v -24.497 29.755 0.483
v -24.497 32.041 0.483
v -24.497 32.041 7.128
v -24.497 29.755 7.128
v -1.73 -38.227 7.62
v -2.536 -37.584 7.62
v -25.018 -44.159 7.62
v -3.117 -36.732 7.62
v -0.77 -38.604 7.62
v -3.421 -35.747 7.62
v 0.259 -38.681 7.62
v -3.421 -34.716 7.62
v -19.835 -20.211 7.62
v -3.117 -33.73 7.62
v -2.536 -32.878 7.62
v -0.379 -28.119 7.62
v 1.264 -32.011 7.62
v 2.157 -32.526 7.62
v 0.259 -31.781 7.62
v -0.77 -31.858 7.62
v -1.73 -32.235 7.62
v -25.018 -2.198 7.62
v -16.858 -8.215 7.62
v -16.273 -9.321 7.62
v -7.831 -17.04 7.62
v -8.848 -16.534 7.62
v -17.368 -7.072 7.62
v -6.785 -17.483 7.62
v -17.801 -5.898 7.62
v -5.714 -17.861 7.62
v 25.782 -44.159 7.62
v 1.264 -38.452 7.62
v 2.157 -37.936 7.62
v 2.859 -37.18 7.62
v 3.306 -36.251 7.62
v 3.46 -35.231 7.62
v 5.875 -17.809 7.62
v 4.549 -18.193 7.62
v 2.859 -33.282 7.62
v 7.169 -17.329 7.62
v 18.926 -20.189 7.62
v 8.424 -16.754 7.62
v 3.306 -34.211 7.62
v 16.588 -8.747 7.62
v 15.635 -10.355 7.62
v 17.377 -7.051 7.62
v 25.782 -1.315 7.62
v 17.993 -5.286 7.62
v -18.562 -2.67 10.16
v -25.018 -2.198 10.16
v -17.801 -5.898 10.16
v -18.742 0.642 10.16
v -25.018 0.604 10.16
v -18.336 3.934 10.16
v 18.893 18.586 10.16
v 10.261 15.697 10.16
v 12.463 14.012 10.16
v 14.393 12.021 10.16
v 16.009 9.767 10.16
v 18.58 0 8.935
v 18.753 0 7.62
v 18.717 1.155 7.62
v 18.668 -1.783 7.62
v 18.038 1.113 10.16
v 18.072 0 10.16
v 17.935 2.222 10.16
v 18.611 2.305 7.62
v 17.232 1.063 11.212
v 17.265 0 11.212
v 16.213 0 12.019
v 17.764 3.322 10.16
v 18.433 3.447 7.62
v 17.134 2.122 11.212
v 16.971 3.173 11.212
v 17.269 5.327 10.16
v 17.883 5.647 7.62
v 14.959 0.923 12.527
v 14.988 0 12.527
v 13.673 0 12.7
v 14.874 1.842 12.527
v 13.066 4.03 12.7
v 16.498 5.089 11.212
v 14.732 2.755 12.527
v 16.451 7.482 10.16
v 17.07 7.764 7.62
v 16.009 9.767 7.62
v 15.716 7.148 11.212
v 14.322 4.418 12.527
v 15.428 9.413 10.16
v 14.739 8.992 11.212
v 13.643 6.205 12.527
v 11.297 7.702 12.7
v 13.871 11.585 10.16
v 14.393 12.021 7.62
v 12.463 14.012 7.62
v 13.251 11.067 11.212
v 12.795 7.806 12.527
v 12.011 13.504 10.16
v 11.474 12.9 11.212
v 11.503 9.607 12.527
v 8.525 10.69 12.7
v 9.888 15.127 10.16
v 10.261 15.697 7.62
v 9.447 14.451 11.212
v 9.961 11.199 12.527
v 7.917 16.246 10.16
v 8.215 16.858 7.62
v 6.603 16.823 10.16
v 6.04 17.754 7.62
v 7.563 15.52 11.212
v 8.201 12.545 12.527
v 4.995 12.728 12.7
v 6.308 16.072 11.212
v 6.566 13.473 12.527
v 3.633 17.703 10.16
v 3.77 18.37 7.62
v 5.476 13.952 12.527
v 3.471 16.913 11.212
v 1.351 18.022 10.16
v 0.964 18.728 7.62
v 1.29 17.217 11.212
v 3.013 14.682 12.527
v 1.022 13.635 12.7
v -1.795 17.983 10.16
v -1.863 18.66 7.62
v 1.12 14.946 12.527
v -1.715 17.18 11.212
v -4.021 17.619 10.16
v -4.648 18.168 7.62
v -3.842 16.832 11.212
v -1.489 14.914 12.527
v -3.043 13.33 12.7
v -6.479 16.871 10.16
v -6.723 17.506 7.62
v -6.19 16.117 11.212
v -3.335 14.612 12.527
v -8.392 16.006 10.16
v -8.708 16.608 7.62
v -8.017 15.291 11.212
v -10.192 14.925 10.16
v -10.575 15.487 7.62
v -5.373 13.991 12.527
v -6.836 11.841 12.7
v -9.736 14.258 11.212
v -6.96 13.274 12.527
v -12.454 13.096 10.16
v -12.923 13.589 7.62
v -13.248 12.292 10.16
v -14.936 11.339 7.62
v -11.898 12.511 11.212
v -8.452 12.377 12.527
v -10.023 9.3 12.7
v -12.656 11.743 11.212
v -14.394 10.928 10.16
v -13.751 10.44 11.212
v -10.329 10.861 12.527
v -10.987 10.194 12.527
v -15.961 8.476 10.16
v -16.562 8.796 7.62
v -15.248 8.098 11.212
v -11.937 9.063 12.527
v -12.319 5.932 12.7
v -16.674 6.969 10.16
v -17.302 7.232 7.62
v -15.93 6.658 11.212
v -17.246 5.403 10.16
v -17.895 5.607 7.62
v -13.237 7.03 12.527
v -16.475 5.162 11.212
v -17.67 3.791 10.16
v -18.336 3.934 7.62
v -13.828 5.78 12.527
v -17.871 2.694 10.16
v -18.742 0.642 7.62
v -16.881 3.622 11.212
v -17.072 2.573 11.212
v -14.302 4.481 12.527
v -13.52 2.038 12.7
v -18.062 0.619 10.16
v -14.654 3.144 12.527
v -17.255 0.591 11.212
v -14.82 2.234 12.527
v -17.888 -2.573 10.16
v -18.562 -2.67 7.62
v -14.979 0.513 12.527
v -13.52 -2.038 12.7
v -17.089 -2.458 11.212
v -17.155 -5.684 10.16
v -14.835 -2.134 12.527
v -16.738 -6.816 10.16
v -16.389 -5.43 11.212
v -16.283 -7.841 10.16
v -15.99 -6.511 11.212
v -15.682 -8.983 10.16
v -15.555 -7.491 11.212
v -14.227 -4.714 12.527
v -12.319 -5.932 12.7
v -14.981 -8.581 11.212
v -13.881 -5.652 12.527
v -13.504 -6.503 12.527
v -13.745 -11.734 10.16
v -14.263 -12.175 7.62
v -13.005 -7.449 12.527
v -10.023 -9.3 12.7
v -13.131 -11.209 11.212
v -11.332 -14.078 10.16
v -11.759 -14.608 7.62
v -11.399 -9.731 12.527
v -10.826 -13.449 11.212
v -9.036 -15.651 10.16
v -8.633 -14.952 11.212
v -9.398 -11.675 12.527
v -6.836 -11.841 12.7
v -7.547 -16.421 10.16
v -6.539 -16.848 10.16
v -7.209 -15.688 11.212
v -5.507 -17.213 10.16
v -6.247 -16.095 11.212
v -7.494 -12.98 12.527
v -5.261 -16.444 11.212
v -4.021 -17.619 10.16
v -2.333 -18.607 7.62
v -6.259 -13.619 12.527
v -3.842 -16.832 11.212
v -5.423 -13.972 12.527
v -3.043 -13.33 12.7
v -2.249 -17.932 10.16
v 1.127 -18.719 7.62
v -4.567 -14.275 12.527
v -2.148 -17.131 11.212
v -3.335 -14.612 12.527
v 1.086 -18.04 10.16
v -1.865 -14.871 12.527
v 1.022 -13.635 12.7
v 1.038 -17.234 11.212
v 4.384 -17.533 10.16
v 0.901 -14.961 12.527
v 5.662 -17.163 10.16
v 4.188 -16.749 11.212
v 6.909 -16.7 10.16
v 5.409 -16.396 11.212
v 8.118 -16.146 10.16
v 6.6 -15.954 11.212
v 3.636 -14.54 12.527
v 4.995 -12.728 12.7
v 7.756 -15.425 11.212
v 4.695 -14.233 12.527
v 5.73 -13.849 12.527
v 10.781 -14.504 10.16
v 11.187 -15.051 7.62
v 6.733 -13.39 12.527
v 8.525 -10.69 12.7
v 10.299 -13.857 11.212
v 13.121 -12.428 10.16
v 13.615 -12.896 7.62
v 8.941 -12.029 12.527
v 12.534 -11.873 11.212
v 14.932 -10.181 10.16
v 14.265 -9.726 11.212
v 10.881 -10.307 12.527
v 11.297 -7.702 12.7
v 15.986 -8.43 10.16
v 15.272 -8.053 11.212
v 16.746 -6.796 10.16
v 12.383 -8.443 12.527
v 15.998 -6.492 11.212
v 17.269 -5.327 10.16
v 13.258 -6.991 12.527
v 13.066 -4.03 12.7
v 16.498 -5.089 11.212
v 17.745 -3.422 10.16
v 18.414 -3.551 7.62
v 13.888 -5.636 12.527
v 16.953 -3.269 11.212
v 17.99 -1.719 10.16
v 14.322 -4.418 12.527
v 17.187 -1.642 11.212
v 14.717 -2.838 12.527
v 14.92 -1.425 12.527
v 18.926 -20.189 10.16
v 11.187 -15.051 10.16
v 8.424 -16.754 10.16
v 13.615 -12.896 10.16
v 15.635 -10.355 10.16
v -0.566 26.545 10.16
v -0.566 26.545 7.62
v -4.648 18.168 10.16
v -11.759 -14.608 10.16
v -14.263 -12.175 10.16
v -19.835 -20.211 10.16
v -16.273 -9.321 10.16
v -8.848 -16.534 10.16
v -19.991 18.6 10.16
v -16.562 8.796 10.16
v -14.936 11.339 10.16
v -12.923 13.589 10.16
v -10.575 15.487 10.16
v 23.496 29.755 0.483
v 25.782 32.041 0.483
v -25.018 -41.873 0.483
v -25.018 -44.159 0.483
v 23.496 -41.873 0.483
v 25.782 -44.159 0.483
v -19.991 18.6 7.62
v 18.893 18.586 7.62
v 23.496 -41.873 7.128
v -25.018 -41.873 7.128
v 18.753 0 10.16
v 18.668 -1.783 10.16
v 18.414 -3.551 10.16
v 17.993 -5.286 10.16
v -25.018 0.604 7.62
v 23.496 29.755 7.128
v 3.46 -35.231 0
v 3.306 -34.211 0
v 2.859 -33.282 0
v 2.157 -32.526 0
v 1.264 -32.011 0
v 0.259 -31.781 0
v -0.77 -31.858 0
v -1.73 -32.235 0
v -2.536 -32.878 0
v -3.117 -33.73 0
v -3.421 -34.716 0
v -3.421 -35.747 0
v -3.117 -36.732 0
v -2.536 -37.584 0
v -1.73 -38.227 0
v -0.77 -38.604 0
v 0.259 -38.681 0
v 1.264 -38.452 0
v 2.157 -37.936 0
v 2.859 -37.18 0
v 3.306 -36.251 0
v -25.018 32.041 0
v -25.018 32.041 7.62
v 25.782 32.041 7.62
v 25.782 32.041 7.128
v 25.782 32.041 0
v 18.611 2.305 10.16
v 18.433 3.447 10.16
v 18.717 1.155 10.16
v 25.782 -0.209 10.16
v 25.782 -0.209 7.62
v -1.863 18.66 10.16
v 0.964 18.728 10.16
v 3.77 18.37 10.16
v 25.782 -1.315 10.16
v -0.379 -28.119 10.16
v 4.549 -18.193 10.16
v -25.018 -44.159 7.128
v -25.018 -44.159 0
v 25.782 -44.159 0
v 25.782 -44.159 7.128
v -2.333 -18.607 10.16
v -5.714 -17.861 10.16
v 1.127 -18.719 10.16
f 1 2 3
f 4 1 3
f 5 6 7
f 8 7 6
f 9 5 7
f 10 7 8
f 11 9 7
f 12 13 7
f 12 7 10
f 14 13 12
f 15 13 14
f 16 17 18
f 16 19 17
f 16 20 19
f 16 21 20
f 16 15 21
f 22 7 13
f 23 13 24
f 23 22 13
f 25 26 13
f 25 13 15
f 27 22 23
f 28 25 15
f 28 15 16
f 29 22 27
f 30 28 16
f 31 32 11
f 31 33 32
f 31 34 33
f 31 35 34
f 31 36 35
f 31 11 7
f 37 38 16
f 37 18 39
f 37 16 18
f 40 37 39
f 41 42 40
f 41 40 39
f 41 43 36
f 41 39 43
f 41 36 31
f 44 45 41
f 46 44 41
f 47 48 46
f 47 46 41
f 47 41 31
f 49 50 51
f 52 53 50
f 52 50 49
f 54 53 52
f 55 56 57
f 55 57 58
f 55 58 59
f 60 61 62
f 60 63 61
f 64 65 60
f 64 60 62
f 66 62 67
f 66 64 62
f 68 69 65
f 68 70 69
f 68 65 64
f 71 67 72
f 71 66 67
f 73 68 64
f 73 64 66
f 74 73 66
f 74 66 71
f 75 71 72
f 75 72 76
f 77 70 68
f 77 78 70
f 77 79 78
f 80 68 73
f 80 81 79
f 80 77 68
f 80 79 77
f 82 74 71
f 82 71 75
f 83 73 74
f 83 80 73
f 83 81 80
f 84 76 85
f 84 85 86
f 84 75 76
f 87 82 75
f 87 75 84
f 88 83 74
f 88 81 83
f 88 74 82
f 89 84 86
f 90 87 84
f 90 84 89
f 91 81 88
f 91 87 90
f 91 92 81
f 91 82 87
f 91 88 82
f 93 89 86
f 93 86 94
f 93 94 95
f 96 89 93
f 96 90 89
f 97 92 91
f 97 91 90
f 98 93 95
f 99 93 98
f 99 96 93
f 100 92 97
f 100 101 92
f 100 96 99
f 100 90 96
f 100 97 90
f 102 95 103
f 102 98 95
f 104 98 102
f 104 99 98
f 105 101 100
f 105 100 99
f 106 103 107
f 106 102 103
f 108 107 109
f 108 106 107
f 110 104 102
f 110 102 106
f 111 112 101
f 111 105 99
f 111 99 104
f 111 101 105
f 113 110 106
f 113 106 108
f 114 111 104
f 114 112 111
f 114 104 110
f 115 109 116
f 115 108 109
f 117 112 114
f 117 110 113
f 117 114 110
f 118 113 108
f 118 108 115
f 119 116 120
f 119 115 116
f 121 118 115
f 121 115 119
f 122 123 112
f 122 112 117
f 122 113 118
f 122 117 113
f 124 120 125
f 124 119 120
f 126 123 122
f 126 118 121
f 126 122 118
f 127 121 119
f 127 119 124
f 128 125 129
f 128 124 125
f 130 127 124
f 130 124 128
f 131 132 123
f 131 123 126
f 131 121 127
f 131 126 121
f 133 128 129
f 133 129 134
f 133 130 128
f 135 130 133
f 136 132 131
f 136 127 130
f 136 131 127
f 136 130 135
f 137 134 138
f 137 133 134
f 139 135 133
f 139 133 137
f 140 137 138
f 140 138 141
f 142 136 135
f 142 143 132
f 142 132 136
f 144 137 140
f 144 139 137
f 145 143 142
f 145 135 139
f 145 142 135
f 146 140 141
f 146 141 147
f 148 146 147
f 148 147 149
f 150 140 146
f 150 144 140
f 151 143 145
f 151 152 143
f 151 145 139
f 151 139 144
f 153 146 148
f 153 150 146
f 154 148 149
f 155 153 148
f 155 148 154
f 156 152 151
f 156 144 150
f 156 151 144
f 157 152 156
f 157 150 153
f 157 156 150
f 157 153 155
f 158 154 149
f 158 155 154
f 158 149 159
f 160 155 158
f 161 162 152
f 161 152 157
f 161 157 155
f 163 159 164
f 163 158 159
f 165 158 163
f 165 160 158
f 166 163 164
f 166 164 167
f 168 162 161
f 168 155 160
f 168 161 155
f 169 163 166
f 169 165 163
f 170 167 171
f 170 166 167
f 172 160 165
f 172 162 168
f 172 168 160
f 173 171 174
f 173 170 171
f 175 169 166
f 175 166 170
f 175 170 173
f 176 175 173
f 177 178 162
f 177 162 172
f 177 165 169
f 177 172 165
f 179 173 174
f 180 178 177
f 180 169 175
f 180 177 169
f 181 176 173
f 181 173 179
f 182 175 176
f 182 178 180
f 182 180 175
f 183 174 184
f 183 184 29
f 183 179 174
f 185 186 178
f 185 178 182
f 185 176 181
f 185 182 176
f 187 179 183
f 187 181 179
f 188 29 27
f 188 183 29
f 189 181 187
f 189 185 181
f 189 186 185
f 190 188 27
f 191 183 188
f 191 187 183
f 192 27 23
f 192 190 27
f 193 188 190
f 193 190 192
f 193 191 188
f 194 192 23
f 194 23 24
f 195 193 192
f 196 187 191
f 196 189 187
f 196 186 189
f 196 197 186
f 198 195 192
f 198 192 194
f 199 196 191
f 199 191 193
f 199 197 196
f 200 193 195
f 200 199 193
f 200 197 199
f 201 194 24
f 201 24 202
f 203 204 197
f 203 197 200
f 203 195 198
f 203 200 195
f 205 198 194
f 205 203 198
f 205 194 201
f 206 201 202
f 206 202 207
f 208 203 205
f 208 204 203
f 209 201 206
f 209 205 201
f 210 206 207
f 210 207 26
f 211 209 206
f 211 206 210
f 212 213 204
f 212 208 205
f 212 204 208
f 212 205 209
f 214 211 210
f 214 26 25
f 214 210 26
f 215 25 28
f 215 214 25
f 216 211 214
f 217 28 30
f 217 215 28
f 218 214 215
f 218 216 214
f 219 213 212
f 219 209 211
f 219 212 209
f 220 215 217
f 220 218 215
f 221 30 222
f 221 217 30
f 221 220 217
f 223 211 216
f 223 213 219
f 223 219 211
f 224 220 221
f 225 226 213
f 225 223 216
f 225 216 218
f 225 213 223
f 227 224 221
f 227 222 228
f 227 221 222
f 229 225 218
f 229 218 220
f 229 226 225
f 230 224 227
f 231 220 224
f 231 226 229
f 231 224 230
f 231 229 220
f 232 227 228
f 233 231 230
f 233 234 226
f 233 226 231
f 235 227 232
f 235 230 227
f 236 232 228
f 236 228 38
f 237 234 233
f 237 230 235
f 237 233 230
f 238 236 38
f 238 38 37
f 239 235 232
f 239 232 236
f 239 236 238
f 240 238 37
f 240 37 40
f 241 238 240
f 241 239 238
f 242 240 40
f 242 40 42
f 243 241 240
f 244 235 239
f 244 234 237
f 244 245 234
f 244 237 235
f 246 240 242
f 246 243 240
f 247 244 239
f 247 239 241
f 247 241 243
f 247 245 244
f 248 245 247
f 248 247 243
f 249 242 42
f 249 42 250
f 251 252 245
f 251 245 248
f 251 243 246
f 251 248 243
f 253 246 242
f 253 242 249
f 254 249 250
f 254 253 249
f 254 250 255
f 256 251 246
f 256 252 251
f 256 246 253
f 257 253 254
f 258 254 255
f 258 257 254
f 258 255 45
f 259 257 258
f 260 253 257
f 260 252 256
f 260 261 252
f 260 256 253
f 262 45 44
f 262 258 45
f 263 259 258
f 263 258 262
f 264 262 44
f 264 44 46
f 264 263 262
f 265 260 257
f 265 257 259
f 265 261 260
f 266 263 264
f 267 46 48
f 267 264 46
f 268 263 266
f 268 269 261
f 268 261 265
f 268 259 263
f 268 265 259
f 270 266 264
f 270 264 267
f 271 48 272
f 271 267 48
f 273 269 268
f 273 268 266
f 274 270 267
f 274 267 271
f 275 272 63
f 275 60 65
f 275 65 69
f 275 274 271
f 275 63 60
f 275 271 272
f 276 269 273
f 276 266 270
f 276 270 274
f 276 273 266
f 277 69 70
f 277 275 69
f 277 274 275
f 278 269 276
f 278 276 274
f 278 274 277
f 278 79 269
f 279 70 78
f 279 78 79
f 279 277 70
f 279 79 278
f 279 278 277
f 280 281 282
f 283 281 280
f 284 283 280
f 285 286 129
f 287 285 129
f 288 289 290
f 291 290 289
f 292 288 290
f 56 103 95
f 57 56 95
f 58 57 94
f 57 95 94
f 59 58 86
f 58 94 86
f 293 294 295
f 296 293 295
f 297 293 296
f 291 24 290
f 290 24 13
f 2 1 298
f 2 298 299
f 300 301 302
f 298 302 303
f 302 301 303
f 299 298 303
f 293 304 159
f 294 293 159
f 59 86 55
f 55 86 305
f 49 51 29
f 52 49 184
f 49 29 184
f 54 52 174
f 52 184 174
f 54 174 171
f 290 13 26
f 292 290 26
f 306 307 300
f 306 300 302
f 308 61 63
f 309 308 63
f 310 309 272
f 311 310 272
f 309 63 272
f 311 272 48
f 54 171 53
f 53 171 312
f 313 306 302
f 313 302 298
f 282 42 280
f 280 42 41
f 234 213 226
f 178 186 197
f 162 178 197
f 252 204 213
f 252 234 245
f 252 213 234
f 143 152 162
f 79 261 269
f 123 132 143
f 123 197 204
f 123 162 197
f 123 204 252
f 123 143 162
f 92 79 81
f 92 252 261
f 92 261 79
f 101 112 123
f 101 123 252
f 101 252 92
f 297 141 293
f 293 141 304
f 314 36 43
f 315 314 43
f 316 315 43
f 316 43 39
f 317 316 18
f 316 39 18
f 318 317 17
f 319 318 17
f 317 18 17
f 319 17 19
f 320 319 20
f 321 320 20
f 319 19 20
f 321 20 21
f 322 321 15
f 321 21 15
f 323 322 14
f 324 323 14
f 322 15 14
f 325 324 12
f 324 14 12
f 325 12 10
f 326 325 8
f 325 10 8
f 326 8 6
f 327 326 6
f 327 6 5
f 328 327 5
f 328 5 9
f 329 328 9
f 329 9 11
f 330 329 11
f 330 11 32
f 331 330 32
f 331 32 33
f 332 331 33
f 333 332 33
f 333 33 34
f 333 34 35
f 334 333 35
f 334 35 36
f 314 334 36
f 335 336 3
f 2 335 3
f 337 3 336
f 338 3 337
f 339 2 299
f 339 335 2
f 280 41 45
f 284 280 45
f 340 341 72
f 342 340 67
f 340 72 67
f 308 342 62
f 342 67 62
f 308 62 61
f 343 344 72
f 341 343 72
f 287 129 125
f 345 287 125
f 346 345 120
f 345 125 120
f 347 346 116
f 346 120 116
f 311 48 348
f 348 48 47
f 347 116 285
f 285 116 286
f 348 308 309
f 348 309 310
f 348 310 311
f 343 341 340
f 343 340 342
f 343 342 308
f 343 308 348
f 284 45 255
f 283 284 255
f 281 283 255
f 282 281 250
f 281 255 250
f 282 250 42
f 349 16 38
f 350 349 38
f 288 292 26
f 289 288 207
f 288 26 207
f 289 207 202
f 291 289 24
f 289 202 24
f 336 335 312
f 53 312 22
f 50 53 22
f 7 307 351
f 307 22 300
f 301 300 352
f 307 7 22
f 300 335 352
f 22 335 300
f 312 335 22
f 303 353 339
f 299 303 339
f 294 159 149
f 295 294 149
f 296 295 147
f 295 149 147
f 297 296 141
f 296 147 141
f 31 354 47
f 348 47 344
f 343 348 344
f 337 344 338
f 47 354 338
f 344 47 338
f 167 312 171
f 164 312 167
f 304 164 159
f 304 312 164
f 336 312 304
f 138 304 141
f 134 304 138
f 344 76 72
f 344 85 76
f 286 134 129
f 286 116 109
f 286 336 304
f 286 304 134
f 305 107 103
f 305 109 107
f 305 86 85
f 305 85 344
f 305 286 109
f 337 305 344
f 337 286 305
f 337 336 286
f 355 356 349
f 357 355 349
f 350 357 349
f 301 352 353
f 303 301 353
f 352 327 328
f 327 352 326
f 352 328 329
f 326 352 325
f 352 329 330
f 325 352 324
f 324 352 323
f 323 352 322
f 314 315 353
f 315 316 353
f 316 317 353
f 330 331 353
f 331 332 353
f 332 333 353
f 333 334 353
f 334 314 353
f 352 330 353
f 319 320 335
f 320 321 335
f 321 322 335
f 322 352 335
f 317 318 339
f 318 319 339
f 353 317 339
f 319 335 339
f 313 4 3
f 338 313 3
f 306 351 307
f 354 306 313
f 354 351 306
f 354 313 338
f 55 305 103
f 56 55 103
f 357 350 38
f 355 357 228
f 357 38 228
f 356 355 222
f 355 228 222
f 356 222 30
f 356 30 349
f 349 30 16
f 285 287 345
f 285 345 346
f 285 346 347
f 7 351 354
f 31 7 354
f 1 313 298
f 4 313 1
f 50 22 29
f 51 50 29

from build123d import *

# Parameters (mm, degrees)
F0_W      = 50.8
F0_H      = 76.2
F1_DEPTH  = 7.62
F2_R      = 18.7529717457
F3_DEPTH  = 5.08
F4_R      = 5.07999
F7_DEPTH  = 2.54
F8_W      = 50.2787431046
F8_H      = 6.6451809329
F9_DEPTH  = 2.286
F10_W     = 73.914
F10_H     = 6.6451809329
F11_DEPTH = 2.286
F12_W     = 48.514
F12_H     = 6.6451809329
F13_DEPTH = 2.286
F14_R     = 3.4596539052
F15_DEPTH = 25.4


# Not quite as in the source:
# - a fillet or chamfer is up to 0.001 mm smaller than in the source, because OpenCascade refuses the exact size


with BuildPart() as f1:
    # F0 (on Top) → F1 (new body)
    with BuildSketch(Plane.XY):
        with Locations((0.3819083795, -6.0587156958)):
            Rectangle(F0_W, F0_H)
    extrude(amount=F1_DEPTH)

    # F2 (on face) → F3 (join)
    with BuildSketch(Plane.XY.offset(7.62)):
        Circle(F2_R)
    extrude(amount=F3_DEPTH)

    # F4 (radius 5.08 in the source; OpenCascade refuses exactly that, so slightly less here)
    f4_edges = [f1.edges().sort_by_distance(p)[0] for p in [
        (-18.752972, 0, 12.7),
    ]]
    fillet(f4_edges, radius=F4_R)

    # F5 (on face) + F6 (on face) → F7 (join)
    with BuildSketch(Plane.XY.offset(7.62)):
        with BuildLine():
            ThreePointArc((-17.8012941845, -5.8981246722), (-18.7253311698, -1.0178024727), (-18.33570835, 3.9339228004))
            Line((-18.33570835, 3.9339228004), (-25.0180916205, 0.604446249))
            Line((-25.0180916205, 0.604446249), (-25.0180916205, -2.1975415816))
            Line((-25.0180916205, -2.1975415816), (-17.8012941845, -5.8981246722))
        make_face()
        with BuildLine():
            Line((-0.56613778, 26.5454184264), (-4.6479069665, 18.1678537567))
            ThreePointArc((-4.6479069665, 18.1678537567), (-0.450512239, 18.7475595216), (3.7698827091, 18.3701370069))
            Line((3.7698827091, 18.3701370069), (-0.56613778, 26.5454184264))
        make_face()
        with BuildLine():
            Line((18.8934579492, 18.5859743506), (10.2606709283, 15.6968971901))
            ThreePointArc((10.2606709283, 15.6968971901), (13.4651875999, 13.0523052444), (16.0087319261, 9.7670083143))
            Line((16.0087319261, 9.7670083143), (18.8934579492, 18.5859743506))
        make_face()
        with BuildLine():
            Line((25.7819083795, -1.3151803242), (25.7819083795, -0.2086242448))
            Line((25.7819083795, -0.2086242448), (18.4334550561, 3.4469818664))
            ThreePointArc((18.4334550561, 3.4469818664), (18.6729217202, 1.7308794659), (18.7529717457, 0))
            ThreePointArc((18.7529717457, 0), (18.5619015059, -2.6701613771), (17.9925843387, -5.2859112847))
            Line((17.9925843387, -5.2859112847), (25.7819083795, -1.3151803242))
        make_face()
        with BuildLine():
            ThreePointArc((15.6345242212, -10.3554624074), (12.4475757879, -14.0261115887), (8.4242275529, -16.7542931642))
            Line((8.4242275529, -16.7542931642), (18.9255586046, -20.1893288404))
            Line((18.9255586046, -20.1893288404), (15.6345242212, -10.3554624074))
        make_face()
        with BuildLine():
            ThreePointArc((4.5489366376, -18.1928866528), (-0.6058031571, -18.7431841433), (-5.7142487726, -17.8611676623))
            Line((-5.7142487726, -17.8611676623), (-0.3793946235, -28.119046241))
            Line((-0.3793946235, -28.119046241), (4.5489366376, -18.1928866528))
        make_face()
        with BuildLine():
            ThreePointArc((-8.8478629176, -16.5344873245), (-13.0678043341, -13.4501464371), (-16.2725260484, -9.3208822167))
            Line((-16.2725260484, -9.3208822167), (-19.8348792175, -20.2114386703))
            Line((-19.8348792175, -20.2114386703), (-8.8478629176, -16.5344873245))
        make_face()
    with BuildSketch(Plane.XY.offset(7.62)):
        with BuildLine():
            Line((-10.5754289904, 15.4865829337), (-19.9908912182, 18.6000298709))
            Line((-19.9908912182, 18.6000298709), (-16.5623554019, 8.7955859859))
            ThreePointArc((-16.5623554019, 8.7955859859), (-13.9752350774, 12.5046692809), (-10.5754289904, 15.4865829337))
        make_face()
    extrude(amount=F7_DEPTH)

    # F8 (on face) → F9 (cut)
    with BuildSketch(Plane(origin=(0, 32.0412843042, 0), x_dir=(-1, 0, 0), z_dir=(0, 1, 0))):
        with Locations((-0.6425368272, 3.8051904665)):
            Rectangle(F8_W, F8_H)
    extrude(amount=-F9_DEPTH, mode=Mode.SUBTRACT)

    # F10 (on face) → F11 (cut)
    with BuildSketch(Plane.YZ.offset(25.7819083795)):
        with Locations((-7.2017156958, 3.8051904665)):
            Rectangle(F10_W, F10_H)
    extrude(amount=-F11_DEPTH, mode=Mode.SUBTRACT)

    # F12 (on face) → F13 (cut)
    with BuildSketch(Plane.XZ.offset(44.1587156958)):
        with Locations((-0.7610916205, 3.8051904665)):
            Rectangle(F12_W, F12_H)
    extrude(amount=-F13_DEPTH, mode=Mode.SUBTRACT)

    # F14 (on face) → F15 (cut)
    with BuildSketch(Plane.XY.offset(7.62)):
        with Locations((0, -35.2311357856)):
            Circle(F14_R)
    extrude(amount=-F15_DEPTH, mode=Mode.SUBTRACT)


solid = f1.part
